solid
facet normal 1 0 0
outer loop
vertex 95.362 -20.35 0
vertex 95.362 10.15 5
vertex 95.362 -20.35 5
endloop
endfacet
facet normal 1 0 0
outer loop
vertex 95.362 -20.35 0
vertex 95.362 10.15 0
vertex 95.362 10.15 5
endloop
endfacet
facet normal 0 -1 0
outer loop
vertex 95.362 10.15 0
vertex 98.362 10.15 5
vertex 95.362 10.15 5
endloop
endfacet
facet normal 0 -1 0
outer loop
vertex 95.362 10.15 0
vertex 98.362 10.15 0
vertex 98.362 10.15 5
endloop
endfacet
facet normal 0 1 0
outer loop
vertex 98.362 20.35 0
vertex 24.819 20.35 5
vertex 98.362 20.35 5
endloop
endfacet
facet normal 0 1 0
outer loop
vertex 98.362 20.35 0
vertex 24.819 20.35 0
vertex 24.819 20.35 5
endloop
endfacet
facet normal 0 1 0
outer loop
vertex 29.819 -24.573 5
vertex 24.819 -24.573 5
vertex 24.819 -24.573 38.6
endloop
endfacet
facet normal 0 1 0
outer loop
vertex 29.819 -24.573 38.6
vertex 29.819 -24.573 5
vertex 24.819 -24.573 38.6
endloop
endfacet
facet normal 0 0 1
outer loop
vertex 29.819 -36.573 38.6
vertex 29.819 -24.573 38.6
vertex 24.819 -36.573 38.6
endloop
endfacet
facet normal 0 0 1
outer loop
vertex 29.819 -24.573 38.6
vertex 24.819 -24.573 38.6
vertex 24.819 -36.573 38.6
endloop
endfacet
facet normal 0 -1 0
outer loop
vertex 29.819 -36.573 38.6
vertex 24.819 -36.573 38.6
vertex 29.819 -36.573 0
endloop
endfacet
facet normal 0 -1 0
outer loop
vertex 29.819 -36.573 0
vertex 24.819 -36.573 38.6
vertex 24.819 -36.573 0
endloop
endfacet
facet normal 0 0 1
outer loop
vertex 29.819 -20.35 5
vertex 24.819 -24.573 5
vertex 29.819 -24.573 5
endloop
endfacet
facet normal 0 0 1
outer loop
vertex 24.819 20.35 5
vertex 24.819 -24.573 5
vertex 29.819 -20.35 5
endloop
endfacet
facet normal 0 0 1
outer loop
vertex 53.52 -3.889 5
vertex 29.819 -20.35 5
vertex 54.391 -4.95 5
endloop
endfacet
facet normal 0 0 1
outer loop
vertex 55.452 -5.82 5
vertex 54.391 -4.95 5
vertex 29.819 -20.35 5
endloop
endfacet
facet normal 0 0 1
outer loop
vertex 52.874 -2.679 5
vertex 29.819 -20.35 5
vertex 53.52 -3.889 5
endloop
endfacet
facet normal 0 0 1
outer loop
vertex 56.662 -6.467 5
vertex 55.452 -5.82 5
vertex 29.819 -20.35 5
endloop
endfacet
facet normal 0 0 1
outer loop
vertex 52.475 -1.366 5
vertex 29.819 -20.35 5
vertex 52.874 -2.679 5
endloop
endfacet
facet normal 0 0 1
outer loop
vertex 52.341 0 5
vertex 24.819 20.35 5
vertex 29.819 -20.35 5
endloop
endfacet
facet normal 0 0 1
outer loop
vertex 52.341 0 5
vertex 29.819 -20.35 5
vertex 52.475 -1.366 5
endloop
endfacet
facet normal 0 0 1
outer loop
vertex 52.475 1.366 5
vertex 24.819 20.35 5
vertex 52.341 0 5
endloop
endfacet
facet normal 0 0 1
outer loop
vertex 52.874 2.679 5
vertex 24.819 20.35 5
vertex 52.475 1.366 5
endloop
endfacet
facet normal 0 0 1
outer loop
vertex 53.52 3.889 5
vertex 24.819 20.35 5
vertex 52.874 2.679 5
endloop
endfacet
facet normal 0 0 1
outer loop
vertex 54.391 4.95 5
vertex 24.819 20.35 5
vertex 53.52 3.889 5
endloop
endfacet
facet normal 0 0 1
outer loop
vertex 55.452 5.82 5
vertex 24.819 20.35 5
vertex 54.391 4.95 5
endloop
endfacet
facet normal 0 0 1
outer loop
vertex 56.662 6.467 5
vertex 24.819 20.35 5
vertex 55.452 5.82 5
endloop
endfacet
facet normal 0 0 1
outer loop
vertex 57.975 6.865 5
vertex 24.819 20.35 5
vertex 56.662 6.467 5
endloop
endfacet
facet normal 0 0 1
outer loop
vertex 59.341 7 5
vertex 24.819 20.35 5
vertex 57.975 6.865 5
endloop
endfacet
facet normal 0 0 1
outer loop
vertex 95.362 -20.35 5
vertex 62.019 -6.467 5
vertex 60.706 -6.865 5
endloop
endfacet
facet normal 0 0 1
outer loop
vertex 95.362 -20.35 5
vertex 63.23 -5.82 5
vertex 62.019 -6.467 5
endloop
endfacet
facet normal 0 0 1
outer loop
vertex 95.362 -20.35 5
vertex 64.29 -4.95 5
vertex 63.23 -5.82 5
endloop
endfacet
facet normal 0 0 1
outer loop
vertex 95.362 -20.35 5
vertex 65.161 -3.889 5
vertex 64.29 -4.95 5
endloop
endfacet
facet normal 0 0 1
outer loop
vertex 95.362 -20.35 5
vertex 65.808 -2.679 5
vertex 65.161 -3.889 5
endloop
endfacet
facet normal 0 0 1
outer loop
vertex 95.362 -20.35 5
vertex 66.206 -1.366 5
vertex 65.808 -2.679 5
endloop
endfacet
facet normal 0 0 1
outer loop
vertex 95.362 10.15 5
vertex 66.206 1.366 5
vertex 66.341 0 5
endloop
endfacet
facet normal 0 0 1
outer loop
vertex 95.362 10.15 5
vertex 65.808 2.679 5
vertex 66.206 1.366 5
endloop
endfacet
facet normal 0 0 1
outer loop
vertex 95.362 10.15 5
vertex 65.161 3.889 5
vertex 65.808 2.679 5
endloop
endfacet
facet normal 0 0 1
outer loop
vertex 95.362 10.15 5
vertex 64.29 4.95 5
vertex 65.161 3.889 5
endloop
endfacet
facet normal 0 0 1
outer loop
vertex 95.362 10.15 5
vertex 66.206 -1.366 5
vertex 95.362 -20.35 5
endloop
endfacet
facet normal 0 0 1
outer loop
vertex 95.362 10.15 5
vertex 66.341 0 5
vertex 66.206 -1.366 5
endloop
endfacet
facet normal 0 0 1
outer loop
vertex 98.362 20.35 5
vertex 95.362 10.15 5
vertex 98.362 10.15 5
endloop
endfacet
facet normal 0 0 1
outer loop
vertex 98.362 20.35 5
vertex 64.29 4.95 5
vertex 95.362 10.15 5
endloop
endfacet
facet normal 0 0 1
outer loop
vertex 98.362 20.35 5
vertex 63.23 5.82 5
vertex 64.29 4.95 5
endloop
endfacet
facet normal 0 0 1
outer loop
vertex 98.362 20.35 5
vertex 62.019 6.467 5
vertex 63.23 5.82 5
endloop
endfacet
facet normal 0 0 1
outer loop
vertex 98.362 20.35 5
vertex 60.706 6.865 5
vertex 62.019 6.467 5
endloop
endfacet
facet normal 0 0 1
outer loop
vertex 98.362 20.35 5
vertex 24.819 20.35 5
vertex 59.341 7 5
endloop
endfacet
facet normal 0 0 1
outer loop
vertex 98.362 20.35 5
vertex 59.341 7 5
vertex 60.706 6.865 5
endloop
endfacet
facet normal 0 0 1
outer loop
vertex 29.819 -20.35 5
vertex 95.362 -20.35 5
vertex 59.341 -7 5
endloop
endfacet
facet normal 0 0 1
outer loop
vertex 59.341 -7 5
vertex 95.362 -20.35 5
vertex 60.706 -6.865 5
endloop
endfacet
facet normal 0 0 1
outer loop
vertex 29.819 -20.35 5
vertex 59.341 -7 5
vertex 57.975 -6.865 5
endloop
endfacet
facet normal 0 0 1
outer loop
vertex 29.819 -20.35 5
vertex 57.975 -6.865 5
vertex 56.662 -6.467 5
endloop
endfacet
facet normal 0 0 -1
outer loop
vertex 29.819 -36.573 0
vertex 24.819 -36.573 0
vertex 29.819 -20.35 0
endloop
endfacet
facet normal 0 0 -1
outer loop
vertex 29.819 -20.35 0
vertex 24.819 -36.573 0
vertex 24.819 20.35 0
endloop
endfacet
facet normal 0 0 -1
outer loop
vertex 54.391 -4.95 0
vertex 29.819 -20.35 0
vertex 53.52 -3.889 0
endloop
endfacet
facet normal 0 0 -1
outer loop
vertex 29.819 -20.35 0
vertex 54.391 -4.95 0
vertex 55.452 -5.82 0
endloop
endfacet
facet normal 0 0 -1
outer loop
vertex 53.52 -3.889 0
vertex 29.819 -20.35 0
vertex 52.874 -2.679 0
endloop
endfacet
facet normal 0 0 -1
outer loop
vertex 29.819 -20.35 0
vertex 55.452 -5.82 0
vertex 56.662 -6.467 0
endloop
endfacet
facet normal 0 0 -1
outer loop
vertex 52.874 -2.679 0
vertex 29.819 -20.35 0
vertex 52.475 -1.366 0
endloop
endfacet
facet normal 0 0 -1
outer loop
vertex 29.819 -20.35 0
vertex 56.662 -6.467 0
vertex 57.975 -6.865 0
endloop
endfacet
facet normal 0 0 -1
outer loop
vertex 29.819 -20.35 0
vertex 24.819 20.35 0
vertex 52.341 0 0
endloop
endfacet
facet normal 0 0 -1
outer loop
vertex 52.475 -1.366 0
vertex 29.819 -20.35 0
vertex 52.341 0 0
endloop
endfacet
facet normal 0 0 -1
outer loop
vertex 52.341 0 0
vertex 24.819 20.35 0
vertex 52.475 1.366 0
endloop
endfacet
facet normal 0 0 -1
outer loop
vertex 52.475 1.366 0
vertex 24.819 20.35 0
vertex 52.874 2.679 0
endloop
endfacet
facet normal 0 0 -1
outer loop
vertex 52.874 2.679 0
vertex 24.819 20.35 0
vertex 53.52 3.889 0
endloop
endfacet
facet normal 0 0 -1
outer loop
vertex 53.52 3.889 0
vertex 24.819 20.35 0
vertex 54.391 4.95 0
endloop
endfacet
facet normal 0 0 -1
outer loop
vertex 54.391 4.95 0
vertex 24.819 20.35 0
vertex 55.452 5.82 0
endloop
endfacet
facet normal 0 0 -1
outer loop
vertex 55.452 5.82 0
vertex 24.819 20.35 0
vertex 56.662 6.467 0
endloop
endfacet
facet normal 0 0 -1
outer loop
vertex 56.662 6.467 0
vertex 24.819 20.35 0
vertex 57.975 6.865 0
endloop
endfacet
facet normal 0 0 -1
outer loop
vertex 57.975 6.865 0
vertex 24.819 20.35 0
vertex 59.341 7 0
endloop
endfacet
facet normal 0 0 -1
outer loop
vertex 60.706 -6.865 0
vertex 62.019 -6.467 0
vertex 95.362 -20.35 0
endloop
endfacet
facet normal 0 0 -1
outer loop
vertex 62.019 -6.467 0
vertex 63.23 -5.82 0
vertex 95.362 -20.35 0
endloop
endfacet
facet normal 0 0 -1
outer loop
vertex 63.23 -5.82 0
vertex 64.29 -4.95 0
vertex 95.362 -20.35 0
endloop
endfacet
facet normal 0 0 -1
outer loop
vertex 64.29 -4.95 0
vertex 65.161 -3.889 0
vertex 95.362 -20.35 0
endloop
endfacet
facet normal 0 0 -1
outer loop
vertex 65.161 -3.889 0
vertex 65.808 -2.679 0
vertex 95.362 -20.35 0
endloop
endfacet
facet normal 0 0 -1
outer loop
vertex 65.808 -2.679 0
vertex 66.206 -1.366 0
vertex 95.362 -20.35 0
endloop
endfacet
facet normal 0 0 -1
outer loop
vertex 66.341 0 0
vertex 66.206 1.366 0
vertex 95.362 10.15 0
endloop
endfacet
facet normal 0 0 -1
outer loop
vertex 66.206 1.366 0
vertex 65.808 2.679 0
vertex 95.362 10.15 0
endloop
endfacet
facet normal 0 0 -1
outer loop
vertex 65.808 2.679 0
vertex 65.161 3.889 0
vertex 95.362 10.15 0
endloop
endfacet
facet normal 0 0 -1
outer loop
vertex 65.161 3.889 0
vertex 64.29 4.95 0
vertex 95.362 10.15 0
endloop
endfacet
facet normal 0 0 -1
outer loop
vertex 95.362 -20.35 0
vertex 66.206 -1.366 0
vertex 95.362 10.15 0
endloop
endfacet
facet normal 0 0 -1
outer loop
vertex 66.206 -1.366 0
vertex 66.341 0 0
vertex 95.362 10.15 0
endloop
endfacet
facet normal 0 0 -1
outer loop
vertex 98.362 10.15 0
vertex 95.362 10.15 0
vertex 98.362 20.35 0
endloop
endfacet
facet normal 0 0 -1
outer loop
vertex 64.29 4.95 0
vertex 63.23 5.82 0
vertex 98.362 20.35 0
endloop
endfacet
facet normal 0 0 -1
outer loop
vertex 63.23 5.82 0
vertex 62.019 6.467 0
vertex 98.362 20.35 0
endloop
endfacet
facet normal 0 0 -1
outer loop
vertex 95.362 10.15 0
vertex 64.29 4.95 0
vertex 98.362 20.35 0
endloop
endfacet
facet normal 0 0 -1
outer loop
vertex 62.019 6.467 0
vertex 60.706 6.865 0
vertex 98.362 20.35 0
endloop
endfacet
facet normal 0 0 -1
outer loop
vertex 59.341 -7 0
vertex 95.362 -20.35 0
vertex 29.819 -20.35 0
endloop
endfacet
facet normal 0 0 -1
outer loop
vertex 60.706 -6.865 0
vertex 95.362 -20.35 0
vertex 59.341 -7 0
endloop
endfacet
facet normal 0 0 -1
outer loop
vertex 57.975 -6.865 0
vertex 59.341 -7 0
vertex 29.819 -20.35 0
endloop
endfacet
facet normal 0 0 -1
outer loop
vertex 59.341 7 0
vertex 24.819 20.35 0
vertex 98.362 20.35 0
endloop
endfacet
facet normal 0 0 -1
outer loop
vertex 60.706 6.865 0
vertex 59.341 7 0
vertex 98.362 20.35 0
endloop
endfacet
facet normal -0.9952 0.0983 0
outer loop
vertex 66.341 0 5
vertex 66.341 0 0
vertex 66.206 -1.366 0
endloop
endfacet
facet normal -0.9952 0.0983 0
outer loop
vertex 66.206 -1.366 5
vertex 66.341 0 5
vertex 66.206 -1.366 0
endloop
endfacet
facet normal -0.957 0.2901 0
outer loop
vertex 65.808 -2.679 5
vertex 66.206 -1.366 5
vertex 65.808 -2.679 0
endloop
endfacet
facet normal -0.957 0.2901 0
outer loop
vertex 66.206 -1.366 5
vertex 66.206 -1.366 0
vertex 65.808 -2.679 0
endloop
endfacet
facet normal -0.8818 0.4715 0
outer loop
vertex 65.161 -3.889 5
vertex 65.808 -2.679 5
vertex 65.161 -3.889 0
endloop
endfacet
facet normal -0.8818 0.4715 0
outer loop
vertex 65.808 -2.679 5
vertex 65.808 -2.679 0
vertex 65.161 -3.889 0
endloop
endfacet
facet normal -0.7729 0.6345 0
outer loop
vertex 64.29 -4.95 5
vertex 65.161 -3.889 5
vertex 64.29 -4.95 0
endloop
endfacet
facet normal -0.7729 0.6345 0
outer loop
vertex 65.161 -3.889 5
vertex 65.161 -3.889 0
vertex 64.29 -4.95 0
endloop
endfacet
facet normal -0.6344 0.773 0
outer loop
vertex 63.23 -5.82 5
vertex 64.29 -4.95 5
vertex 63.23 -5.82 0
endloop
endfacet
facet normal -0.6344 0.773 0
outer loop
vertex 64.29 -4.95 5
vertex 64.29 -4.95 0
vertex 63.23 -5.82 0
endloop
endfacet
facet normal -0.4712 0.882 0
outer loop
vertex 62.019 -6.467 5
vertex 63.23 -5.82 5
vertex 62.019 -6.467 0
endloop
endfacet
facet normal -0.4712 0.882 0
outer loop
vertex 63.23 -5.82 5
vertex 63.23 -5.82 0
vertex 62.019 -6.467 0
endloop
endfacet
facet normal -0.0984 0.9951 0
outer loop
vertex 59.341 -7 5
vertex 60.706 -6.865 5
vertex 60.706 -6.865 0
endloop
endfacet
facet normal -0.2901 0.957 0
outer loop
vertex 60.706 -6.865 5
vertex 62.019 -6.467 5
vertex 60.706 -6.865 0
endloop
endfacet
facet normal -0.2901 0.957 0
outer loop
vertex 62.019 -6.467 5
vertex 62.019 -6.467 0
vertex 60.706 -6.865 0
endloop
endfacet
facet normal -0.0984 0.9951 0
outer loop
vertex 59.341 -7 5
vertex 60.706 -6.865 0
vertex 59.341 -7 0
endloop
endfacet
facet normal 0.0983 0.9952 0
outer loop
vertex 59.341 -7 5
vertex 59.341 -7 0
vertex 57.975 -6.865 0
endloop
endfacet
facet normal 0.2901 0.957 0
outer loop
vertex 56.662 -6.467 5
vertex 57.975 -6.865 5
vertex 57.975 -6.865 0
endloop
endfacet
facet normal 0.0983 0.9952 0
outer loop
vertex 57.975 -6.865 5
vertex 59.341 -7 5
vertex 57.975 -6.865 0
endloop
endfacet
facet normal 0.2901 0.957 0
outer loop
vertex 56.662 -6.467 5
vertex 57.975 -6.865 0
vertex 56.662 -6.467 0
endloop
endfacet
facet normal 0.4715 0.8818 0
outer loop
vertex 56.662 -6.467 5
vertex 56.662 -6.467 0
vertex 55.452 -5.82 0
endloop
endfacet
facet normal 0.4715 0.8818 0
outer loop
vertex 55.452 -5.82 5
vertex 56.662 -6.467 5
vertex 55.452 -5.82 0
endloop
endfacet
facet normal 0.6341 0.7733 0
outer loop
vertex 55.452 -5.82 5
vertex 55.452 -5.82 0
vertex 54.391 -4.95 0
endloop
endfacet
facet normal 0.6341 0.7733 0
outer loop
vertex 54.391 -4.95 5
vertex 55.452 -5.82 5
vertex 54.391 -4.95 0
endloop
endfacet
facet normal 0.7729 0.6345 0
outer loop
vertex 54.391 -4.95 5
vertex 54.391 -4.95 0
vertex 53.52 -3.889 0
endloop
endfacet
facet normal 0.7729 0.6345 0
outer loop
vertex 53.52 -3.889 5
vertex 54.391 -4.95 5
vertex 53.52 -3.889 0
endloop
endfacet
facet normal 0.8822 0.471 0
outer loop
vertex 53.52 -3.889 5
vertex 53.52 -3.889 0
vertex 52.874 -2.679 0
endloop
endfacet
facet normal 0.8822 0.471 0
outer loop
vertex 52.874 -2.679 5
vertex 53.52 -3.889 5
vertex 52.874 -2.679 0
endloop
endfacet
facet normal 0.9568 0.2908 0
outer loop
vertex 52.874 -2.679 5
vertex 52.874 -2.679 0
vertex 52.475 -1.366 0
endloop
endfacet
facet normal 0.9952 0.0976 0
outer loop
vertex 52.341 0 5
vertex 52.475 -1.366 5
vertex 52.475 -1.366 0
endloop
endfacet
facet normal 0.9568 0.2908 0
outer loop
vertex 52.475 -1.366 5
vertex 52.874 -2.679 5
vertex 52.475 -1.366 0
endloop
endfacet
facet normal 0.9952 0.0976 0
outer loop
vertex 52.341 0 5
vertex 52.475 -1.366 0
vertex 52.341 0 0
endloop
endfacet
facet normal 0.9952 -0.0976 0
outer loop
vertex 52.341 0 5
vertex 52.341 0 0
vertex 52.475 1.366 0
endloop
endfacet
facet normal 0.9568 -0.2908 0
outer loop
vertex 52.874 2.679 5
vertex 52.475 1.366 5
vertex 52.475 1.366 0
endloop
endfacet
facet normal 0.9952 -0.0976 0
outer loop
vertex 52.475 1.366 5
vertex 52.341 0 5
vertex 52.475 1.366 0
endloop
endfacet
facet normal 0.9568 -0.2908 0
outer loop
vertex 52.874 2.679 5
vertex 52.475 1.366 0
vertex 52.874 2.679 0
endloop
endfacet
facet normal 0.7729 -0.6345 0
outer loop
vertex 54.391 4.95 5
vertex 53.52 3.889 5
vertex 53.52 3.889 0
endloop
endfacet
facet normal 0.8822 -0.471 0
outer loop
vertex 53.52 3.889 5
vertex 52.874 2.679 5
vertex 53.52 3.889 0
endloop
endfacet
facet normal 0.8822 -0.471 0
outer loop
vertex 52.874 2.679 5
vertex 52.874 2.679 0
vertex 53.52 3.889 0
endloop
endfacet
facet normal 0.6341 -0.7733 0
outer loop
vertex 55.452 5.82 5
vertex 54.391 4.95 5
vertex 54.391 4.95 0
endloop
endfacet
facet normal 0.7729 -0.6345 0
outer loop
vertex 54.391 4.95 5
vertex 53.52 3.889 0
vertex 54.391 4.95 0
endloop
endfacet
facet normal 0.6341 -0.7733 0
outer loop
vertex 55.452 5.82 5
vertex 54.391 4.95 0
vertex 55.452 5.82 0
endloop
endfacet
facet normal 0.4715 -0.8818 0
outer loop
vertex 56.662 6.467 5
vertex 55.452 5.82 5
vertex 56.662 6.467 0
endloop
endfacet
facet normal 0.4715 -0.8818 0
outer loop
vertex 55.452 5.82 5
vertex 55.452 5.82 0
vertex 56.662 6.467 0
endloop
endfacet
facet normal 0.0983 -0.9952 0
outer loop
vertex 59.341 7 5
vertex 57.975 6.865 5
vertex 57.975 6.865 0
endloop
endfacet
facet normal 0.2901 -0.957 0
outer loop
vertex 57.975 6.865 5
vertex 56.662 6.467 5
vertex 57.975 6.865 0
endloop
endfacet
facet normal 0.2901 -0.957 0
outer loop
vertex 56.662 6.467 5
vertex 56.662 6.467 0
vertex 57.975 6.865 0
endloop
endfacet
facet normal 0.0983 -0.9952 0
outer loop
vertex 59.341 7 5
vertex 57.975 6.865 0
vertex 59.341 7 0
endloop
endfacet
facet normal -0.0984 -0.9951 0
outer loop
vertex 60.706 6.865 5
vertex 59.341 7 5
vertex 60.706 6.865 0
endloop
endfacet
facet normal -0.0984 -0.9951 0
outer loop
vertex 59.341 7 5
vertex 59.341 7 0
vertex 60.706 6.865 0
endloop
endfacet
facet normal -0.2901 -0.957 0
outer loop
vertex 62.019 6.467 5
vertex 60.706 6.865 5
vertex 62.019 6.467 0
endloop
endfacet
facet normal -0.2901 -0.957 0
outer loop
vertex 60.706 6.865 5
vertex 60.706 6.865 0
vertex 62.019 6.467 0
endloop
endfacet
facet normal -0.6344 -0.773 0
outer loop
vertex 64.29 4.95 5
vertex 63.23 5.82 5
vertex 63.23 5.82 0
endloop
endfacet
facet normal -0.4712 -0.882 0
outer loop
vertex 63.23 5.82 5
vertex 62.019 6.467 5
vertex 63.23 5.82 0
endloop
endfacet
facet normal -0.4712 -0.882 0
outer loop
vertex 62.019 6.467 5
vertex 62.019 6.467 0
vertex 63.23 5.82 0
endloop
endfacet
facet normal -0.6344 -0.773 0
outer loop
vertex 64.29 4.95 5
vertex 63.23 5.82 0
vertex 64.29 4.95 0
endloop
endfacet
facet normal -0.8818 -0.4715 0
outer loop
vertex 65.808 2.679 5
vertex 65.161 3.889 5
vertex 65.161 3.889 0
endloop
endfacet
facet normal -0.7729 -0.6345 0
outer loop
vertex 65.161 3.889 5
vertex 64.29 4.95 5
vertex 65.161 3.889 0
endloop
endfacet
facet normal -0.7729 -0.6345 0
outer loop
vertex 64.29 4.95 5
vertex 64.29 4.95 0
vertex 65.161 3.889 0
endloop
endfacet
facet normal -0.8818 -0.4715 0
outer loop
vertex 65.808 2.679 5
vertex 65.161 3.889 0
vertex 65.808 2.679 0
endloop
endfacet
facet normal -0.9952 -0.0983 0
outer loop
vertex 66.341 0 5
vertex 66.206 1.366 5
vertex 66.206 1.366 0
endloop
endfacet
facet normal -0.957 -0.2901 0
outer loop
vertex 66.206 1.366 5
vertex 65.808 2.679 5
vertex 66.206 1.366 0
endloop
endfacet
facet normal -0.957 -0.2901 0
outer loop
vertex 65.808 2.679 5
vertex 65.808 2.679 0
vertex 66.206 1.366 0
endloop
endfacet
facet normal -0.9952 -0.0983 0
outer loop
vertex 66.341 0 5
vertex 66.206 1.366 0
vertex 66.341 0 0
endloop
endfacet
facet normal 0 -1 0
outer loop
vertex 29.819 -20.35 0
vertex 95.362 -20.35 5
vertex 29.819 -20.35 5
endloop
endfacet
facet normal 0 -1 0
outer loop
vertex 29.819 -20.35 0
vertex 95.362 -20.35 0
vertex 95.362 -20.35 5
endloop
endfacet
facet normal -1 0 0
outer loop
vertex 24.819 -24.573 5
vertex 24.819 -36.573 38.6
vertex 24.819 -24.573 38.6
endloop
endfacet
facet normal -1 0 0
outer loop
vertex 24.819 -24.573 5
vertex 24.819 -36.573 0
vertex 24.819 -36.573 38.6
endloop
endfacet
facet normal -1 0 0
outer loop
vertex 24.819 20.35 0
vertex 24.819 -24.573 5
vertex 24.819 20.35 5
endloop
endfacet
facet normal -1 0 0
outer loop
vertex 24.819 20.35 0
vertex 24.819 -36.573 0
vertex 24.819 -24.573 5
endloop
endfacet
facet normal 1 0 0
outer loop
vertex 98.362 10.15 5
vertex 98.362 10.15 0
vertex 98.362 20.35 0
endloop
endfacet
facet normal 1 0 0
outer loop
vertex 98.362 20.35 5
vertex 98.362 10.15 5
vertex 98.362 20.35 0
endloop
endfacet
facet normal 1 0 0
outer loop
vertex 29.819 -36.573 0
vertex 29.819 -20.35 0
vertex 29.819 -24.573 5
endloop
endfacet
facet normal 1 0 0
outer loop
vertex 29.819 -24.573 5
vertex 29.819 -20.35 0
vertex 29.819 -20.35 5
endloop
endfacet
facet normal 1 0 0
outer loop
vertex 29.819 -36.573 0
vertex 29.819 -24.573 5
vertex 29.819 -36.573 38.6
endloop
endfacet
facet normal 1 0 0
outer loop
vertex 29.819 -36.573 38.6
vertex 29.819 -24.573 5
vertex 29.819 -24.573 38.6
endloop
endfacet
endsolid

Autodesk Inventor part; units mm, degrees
ref_plane "YZ Plane" through (0, 0, 0) normal (1, 0, 0) x (0, 1, 0)
ref_plane "XZ Plane" through (0, 0, 0) normal (0, 1, 0) x (-1, 0, 0)
ref_plane "XY Plane" through (0, 0, 0) normal (0, 0, 1) x (1, 0, 0)
ref_plane "Work Plane1" through (0, 0, 0) normal (0, 0, 1) x (1, 0, 0)
sketch "Sketch1" plane through (0, 0, 0) normal (0, 0, 1) x (1, 0, 0)
  circle A0 centre (103.8623, 15.35) radius 2.15 construction
  circle A1 centre (103.8623, -15.35) radius 2.15 construction
  line L0 (-103.8623, 20.35) -> (-103.8623, -20.35) construction
  line L1 (108.8623, -20.35) -> (-103.8623, -20.35) construction
  line L2 (108.8623, 20.35) -> (108.8623, -20.35) construction
  line L3 (-103.8623, 20.35) -> (108.8623, 20.35) construction
  circle A2 centre (59.3407, 0) radius 6.5 construction
  circle A3 centre (59.3407, 0) radius 7
  circle A4 centre (59.3407, 0) radius 24.5216 construction
  line L4 (34.8192, 0) -> (24.8192, 0) construction
  line L5 (24.8192, -20.35) -> (24.8192, 20.35)
  line L6 (24.8192, 20.35) -> (98.3623, 20.35)
  line L7 (98.8623, -20.35) -> (98.8623, 20.35) construction
  line L8 (98.3623, -20.35) -> (24.8192, -20.35)
  line L9 (95.8623, -23.35) -> (95.8623, 9.65) projected
  line L10 (95.3623, -20.35) -> (24.8192, -20.35)
  line L11 (98.8623, 9.65) -> (95.8623, 9.65) projected
  line L12 (98.8623, 20.35) -> (98.8623, -20.35) projected
  line L13 (98.3623, 10.15) -> (95.3623, 10.15)
  line L14 (95.3623, 10.15) -> (95.3623, -23.3504)
  line L15 (98.3623, 10.15) -> (98.3623, 20.35)
  point P0 (0, 0)
  point P1 (95.3623, -20.35)
  dimension "d0" = 0.5
  dimension "d1" = 10
  dimension "d15" = 0.5
  dimension "d16" = 0.5
  dimension "d17" = 0.5
extrude "Extrusion1" add sketch "Sketch1" along normal blind 5
sketch "Sketch2" plane through (24.8192, -20.35, 0) normal (-1, 0, 0) x (0, 0, 1)
  line L0 (80.8, 35.7) -> (75.8, 35.7) construction
  line L1 (80.8, 45.7) -> (80.8, 35.7) construction
  line L2 (51.1, 45.7) -> (80.8, 45.7) construction
  line L3 (51.1, -4.2229) -> (51.1, 45.7) construction
  line L4 (26.6, -4.2229) -> (51.1, -4.2229) construction
  line L5 (26.6, -16.2229) -> (26.6, -4.2229) construction
  line L6 (65.2, -16.2229) -> (26.6, -16.2229) construction
  line L7 (65.2, 40.7) -> (65.2, -16.2229) construction
  line L8 (75.8, 40.7) -> (65.2, 40.7) construction
  line L9 (75.8, 35.7) -> (75.8, 40.7) construction
  line L10 (38.6, -16.2229) -> (0, -16.2229)
  line L11 (0, -16.2229) -> (0, -4.2229)
  line L12 (5, -4.2229) -> (38.6, -4.2229)
  line L13 (38.6, -4.2229) -> (38.6, -16.2229)
  line L14 (38.6, -10.2229) -> (26.6, -10.2229) construction
  line L15 (0, 40.7) -> (0, 0) construction
  line L16 (0, 0) -> (5, 0) construction
  line L17 (5, 40.7) -> (5, 0) construction
  line L18 (0, 40.7) -> (5, 40.7) construction
  line L19 (5, 5) -> (0, 5)
  line L20 (0, -4.2229) -> (0, 5)
  line L21 (5, 5) -> (5, -4.2229)
  point P0 (0, 20.35)
  dimension "d11" = 5
extrude "Extrusion2" add sketch "Sketch2" against normal blind 5
equation "\"d15\" = d0"
equation "\"d16\" = d0"
equation "\"d17\" = d0"
equation "\"d9\" = d2"
equation "\"d11\" = d2"
equation "\"d12\" = d2"
equation "\"d2\" = 5"
properties part number "Button Bracket 2"
